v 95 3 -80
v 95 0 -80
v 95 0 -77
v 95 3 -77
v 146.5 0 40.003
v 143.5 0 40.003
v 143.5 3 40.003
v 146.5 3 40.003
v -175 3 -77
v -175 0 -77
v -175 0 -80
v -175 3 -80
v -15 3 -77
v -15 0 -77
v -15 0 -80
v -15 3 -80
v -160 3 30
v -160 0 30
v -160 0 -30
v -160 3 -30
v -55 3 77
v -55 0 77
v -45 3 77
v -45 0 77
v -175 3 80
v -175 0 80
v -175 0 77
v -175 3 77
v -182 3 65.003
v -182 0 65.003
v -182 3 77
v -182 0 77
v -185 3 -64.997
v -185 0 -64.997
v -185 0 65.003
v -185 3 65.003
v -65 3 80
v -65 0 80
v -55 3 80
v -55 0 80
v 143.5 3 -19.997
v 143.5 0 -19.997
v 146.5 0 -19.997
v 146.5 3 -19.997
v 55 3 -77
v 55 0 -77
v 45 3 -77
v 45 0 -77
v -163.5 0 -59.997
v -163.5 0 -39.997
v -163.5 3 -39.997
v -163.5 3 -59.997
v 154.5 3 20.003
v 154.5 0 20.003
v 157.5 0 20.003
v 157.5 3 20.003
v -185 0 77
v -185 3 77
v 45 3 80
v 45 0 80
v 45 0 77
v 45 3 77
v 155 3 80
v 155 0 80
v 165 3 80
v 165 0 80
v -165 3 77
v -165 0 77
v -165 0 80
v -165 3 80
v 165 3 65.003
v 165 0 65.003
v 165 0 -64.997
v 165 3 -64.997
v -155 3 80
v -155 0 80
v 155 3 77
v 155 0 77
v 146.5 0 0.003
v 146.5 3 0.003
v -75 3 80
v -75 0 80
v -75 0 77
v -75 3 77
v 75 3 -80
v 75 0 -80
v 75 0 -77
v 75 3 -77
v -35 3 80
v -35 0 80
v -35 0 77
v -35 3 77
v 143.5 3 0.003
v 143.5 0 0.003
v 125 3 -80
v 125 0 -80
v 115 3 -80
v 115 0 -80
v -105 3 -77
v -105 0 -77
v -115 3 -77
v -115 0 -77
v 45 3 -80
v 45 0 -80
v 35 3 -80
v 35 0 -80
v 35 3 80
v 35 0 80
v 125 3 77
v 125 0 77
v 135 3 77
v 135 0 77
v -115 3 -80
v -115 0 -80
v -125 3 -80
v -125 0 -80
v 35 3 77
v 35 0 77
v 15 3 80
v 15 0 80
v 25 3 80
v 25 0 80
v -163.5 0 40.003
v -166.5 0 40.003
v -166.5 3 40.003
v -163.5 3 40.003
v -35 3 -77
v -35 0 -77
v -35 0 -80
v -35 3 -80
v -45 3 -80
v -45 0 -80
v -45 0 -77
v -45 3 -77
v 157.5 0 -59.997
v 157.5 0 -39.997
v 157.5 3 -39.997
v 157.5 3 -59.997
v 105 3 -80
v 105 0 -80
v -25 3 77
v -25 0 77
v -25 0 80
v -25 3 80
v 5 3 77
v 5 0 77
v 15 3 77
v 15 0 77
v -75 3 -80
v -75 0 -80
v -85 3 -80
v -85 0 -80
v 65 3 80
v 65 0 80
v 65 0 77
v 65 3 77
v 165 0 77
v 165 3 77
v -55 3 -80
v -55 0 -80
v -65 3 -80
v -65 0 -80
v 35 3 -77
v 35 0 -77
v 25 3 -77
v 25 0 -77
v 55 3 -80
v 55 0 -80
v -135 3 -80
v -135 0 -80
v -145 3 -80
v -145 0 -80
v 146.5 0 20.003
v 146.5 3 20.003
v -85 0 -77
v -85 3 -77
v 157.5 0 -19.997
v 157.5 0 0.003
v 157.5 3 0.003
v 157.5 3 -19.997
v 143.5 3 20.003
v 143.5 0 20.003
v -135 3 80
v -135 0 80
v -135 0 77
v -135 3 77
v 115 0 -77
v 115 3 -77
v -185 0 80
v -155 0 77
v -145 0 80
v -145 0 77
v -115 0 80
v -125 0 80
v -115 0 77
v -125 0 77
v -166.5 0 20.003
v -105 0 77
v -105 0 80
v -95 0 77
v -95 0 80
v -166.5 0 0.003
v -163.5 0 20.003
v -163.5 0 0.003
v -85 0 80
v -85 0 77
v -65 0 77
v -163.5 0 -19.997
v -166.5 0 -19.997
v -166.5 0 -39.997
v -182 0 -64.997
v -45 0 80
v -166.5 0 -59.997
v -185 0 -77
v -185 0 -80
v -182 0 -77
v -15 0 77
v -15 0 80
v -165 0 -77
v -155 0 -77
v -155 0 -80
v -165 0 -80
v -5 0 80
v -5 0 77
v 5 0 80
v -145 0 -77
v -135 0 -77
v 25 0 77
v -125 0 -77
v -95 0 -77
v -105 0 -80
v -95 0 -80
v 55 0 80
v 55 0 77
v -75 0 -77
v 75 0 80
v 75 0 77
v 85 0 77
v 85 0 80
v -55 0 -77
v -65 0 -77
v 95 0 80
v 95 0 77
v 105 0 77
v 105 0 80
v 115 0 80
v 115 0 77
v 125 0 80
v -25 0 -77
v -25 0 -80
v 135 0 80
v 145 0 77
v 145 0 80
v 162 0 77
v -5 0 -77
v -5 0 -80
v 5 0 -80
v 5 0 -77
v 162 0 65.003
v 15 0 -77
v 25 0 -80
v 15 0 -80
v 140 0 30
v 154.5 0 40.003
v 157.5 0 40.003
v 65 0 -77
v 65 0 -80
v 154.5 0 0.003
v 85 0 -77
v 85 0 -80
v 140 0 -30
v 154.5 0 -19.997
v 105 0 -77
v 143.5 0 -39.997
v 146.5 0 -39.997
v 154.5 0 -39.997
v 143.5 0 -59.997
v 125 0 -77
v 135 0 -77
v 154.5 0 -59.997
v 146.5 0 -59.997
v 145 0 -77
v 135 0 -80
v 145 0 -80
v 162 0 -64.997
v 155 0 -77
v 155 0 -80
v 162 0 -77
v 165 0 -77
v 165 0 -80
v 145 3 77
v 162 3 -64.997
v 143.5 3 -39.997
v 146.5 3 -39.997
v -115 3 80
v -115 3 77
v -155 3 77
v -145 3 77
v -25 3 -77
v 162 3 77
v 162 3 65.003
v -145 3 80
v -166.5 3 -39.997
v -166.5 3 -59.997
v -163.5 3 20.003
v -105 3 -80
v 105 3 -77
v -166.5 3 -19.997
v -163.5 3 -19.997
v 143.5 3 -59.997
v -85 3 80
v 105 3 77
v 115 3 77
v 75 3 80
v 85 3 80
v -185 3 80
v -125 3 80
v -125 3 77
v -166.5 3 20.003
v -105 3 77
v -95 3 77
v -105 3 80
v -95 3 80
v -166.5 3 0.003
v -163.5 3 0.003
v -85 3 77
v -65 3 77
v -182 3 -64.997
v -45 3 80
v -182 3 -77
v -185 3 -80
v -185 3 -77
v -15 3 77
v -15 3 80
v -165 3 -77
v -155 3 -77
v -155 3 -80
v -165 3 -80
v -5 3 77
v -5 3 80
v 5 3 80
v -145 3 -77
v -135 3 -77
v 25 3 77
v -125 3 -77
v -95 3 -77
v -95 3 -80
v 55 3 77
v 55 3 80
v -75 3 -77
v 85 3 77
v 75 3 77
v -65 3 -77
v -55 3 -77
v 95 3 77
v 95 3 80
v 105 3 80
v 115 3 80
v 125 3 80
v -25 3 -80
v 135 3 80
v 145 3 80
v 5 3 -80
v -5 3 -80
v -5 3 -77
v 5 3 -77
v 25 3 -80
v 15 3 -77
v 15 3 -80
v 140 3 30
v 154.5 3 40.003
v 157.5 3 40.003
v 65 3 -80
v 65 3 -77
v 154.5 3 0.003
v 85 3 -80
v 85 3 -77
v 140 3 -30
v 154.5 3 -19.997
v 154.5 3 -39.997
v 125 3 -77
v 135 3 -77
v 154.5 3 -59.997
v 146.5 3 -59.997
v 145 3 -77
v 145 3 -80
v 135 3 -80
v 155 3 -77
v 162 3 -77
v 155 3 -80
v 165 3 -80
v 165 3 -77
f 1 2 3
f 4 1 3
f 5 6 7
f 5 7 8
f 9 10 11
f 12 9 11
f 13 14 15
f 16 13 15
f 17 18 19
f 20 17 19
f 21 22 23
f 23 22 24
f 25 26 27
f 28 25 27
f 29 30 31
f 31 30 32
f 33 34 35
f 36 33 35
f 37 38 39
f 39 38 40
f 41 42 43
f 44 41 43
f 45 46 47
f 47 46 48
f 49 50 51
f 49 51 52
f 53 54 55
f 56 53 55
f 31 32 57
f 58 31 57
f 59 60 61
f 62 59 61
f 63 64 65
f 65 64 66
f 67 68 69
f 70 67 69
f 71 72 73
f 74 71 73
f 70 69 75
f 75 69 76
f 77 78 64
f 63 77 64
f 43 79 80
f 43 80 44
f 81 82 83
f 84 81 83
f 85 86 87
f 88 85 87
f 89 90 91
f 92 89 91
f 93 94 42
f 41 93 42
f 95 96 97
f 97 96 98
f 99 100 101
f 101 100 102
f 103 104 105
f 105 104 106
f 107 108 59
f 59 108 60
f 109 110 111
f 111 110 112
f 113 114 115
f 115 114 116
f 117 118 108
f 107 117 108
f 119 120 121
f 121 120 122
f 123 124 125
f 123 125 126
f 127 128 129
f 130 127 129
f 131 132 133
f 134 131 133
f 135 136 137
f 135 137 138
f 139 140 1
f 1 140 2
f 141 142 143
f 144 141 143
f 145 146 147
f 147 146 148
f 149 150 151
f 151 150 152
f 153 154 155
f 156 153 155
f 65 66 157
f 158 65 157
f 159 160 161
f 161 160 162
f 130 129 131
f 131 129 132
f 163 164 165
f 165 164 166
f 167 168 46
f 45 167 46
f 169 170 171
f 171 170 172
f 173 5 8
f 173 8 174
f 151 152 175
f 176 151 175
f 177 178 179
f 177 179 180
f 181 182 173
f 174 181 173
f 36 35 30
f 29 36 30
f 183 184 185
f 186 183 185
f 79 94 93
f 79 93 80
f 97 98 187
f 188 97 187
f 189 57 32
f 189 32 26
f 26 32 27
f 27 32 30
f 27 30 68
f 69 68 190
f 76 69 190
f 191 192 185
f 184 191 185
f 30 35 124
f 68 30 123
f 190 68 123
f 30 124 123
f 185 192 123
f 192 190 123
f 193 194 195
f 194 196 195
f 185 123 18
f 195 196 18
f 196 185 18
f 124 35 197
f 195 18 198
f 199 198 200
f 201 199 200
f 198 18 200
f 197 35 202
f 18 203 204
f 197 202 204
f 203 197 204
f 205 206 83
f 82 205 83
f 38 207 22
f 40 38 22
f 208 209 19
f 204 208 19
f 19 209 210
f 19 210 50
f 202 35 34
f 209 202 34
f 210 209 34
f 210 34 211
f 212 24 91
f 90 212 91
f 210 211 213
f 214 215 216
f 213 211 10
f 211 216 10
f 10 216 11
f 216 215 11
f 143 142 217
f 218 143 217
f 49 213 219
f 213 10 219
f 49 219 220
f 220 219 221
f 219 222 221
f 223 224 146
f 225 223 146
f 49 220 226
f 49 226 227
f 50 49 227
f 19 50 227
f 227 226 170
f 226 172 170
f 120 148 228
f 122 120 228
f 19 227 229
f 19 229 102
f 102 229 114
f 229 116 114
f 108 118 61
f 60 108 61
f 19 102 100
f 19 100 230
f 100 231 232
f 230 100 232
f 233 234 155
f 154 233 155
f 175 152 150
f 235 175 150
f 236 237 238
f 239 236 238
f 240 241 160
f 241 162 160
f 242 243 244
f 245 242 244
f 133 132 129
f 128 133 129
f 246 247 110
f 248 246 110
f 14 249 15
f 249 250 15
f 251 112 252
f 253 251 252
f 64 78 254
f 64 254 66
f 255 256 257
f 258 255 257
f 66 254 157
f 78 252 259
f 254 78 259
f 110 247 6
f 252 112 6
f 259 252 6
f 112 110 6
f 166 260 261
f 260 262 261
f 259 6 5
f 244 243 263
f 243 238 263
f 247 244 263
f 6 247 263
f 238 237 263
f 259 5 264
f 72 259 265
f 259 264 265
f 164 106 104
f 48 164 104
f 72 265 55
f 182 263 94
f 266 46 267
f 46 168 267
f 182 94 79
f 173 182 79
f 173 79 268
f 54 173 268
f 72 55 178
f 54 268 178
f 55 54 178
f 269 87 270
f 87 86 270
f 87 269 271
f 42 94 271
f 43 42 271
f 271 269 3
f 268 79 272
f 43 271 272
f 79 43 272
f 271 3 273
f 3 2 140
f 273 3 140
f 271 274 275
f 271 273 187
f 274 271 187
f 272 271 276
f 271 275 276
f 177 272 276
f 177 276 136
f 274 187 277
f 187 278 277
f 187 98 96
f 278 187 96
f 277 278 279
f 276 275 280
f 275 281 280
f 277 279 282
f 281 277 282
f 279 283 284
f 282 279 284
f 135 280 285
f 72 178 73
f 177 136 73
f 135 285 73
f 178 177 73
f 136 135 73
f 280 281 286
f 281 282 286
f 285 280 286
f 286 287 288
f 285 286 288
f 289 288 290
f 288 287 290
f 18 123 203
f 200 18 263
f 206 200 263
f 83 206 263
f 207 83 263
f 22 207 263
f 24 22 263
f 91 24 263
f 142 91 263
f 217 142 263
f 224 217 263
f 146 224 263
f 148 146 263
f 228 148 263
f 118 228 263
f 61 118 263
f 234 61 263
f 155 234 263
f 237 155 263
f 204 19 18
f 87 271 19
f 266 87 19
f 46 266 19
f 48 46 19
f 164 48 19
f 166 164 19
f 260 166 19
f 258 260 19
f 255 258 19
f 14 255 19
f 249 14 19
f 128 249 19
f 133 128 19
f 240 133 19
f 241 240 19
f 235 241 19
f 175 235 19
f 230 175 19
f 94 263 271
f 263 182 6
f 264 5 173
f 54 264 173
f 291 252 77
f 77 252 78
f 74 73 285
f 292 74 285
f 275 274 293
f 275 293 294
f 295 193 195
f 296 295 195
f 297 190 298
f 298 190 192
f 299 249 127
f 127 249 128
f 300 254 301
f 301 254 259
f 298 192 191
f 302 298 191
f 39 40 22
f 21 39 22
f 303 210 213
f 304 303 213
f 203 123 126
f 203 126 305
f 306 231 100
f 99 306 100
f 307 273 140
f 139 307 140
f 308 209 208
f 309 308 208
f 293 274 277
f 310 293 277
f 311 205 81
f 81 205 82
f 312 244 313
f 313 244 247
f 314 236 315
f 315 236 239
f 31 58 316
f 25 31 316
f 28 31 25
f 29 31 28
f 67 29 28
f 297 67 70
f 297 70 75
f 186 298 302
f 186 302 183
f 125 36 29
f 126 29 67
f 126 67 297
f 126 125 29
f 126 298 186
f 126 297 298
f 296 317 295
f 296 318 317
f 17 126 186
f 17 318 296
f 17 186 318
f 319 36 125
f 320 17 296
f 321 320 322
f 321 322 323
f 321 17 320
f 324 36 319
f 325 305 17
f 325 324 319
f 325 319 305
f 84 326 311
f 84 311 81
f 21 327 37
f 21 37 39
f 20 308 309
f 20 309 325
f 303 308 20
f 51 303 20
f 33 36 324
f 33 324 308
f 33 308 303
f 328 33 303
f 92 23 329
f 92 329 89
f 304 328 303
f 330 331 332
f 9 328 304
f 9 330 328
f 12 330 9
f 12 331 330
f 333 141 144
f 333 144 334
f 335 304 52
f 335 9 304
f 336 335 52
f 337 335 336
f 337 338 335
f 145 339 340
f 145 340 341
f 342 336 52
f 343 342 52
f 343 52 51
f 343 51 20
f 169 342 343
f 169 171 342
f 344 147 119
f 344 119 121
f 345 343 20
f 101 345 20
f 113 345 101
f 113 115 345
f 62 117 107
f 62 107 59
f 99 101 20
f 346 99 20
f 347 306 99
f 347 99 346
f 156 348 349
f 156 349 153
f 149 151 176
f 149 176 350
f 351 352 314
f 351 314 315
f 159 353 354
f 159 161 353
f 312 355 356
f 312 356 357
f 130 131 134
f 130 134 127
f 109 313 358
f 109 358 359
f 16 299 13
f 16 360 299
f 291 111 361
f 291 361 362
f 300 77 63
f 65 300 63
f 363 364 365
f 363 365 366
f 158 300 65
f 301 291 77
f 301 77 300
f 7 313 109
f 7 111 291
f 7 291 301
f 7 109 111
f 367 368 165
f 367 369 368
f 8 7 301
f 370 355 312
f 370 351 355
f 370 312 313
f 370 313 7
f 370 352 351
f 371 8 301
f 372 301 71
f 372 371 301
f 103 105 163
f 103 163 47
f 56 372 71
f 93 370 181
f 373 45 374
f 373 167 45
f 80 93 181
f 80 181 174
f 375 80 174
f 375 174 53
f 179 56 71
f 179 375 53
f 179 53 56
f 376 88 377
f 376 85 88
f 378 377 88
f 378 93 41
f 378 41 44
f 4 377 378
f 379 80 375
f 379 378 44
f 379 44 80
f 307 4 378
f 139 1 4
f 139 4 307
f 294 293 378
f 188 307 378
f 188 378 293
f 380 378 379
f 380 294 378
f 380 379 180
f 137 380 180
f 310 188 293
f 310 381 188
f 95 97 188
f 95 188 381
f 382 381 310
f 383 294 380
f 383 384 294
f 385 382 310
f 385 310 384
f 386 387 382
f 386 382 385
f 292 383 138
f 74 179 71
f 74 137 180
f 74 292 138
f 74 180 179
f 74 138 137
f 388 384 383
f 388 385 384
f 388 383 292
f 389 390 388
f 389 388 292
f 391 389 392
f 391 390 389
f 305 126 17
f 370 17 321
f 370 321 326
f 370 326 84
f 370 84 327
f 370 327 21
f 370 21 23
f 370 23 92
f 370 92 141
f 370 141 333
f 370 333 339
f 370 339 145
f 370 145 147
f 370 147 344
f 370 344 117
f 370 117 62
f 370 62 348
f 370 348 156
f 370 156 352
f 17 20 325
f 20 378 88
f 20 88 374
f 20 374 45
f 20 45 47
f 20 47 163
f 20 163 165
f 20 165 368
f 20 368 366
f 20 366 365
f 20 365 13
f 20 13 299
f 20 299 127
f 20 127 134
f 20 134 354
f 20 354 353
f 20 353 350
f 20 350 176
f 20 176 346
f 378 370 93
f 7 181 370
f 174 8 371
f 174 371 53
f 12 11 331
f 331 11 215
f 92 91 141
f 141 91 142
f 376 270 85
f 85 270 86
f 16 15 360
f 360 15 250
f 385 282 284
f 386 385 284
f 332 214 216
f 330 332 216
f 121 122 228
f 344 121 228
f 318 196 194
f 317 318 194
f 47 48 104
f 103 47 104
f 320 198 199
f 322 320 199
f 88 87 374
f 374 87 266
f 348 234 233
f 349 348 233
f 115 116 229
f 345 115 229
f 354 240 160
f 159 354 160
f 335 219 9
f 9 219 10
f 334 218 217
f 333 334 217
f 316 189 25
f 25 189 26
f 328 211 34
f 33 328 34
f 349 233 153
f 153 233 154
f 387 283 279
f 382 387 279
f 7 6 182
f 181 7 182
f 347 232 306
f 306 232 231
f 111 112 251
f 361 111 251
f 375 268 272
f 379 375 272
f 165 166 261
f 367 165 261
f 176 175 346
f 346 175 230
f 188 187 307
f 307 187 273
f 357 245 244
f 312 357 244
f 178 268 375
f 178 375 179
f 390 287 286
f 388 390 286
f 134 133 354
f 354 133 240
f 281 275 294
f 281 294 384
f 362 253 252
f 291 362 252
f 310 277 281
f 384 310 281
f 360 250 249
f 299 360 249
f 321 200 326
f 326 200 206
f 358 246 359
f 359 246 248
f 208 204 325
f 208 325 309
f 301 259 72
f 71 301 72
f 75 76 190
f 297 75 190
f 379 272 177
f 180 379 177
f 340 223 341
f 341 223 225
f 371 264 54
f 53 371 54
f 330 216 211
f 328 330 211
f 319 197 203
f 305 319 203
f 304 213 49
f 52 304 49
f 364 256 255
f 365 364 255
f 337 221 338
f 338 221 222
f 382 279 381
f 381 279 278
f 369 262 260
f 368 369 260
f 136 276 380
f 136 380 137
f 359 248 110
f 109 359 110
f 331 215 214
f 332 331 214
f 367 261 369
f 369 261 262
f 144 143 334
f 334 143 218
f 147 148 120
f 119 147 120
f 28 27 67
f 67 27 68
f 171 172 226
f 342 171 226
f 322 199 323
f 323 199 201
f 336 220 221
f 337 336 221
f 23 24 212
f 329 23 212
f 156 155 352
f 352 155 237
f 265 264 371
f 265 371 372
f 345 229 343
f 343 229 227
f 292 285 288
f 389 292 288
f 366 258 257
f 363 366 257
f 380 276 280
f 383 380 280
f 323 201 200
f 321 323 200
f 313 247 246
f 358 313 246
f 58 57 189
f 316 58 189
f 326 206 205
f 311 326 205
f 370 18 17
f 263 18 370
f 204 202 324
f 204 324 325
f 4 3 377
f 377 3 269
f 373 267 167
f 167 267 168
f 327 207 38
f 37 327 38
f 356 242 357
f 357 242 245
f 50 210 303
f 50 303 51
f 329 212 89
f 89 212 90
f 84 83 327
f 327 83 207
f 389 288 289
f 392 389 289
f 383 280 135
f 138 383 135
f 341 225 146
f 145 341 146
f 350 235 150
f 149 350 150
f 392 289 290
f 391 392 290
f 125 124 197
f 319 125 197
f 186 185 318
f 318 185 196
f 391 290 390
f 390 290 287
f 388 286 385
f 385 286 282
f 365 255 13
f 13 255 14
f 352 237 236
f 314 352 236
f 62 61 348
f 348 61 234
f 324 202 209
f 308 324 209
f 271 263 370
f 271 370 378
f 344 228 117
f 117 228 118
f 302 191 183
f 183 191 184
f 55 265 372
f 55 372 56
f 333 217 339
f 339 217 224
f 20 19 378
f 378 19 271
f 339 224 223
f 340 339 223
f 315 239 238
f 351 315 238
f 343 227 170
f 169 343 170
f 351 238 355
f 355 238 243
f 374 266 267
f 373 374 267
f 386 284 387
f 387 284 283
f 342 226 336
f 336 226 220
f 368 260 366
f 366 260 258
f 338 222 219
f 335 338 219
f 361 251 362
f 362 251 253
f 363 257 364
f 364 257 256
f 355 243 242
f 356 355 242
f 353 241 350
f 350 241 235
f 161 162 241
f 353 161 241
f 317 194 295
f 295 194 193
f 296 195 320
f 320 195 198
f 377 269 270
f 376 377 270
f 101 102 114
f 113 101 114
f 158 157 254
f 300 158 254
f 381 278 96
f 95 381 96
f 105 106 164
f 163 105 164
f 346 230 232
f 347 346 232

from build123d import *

# Parameters (mm, degrees)
CROQUIS1_W              = 3
CROQUIS1_H              = 20
CROQUIS1_W_2            = 300
CROQUIS1_H_2            = 60
SALIENTE_EXTRUIR1_DEPTH = 3


with BuildPart() as part:
    # Croquis1 → Saliente-Extruir1 (new body)
    with BuildSketch(Plane(origin=(0, 0, 0), x_dir=(1, 0, 0), z_dir=(0, 1, 0))):
        Polygon((155, -80), (162, -80), (165, -80), (165, -77), (162, -77), (162, -65.002891293), (165, -65.002891293), (165, 64.997108707), (162, 64.997108707), (162, 77), (165, 77), (165, 80), (162, 80), (155, 80), (155, 77), (145, 77), (145, 80), (135, 80), (135, 77), (125, 77), (125, 80), (115, 80), (115, 77), (105, 77), (105, 80), (95, 80), (95, 77), (85, 77), (85, 80), (75, 80), (75, 77), (65, 77), (65, 80), (55, 80), (55, 77), (45, 77), (45, 80), (35, 80), (35, 77), (25, 77), (25, 80), (15, 80), (15, 77), (5, 77), (5, 80), (-5, 80), (-5, 77), (-15, 77), (-15, 80), (-25, 80), (-25, 77), (-35, 77), (-35, 80), (-45, 80), (-45, 77), (-55, 77), (-55, 80), (-65, 80), (-65, 77), (-75, 77), (-75, 80), (-85, 80), (-85, 77), (-95, 77), (-95, 80), (-105, 80), (-105, 77), (-115, 77), (-115, 80), (-125, 80), (-125, 77), (-135, 77), (-135, 80), (-145, 80), (-145, 77), (-155, 77), (-155, 80), (-165, 80), (-165, 77), (-175, 77), (-175, 80), (-182, 80), (-185, 80), (-185, 77), (-182, 77), (-182, 64.997108707), (-185, 64.997108707), (-185, -65.002891293), (-182, -65.002891293), (-182, -77), (-185, -77), (-185, -80), (-182, -80), (-175, -80), (-175, -77), (-165, -77), (-165, -80), (-155, -80), (-155, -77), (-145, -77), (-145, -80), (-135, -80), (-135, -77), (-125, -77), (-125, -80), (-115, -80), (-115, -77), (-105, -77), (-105, -80), (-95, -80), (-95, -77), (-85, -77), (-85, -80), (-75, -80), (-75, -77), (-65, -77), (-65, -80), (-55, -80), (-55, -77), (-45, -77), (-45, -80), (-35, -80), (-35, -77), (-25, -77), (-25, -80), (-15, -80), (-15, -77), (-5, -77), (-5, -80), (5, -80), (5, -77), (15, -77), (15, -80), (25, -80), (25, -77), (35, -77), (35, -80), (45, -80), (45, -77), (55, -77), (55, -80), (65, -80), (65, -77), (75, -77), (75, -80), (85, -80), (85, -77), (95, -77), (95, -80), (105, -80), (105, -77), (115, -77), (115, -80), (125, -80), (125, -77), (135, -77), (135, -80), (145, -80), (145, -77), (155, -77), align=None)
        with Locations((-165, -30.002891293)):
            Rectangle(CROQUIS1_W, CROQUIS1_H, mode=Mode.SUBTRACT)
        with Locations((-10, 0)):
            Rectangle(CROQUIS1_W_2, CROQUIS1_H_2, mode=Mode.SUBTRACT)
        with Locations((156, -30.002891293)):
            Rectangle(CROQUIS1_W, CROQUIS1_H, mode=Mode.SUBTRACT)
        with Locations((-165, 49.997108707)):
            Rectangle(CROQUIS1_W, CROQUIS1_H, mode=Mode.SUBTRACT)
        with Locations((-165, 9.997108707)):
            Rectangle(CROQUIS1_W, CROQUIS1_H, mode=Mode.SUBTRACT)
        with Locations((145, 9.997108707)):
            Rectangle(CROQUIS1_W, CROQUIS1_H, mode=Mode.SUBTRACT)
        with Locations((145, -30.002891293)):
            Rectangle(CROQUIS1_W, CROQUIS1_H, mode=Mode.SUBTRACT)
        with Locations((145, 49.997108707)):
            Rectangle(CROQUIS1_W, CROQUIS1_H, mode=Mode.SUBTRACT)
        with Locations((156, 49.997108707)):
            Rectangle(CROQUIS1_W, CROQUIS1_H, mode=Mode.SUBTRACT)
        with Locations((156, 9.997108707)):
            Rectangle(CROQUIS1_W, CROQUIS1_H, mode=Mode.SUBTRACT)
    extrude(amount=SALIENTE_EXTRUIR1_DEPTH)


solid = part.part
